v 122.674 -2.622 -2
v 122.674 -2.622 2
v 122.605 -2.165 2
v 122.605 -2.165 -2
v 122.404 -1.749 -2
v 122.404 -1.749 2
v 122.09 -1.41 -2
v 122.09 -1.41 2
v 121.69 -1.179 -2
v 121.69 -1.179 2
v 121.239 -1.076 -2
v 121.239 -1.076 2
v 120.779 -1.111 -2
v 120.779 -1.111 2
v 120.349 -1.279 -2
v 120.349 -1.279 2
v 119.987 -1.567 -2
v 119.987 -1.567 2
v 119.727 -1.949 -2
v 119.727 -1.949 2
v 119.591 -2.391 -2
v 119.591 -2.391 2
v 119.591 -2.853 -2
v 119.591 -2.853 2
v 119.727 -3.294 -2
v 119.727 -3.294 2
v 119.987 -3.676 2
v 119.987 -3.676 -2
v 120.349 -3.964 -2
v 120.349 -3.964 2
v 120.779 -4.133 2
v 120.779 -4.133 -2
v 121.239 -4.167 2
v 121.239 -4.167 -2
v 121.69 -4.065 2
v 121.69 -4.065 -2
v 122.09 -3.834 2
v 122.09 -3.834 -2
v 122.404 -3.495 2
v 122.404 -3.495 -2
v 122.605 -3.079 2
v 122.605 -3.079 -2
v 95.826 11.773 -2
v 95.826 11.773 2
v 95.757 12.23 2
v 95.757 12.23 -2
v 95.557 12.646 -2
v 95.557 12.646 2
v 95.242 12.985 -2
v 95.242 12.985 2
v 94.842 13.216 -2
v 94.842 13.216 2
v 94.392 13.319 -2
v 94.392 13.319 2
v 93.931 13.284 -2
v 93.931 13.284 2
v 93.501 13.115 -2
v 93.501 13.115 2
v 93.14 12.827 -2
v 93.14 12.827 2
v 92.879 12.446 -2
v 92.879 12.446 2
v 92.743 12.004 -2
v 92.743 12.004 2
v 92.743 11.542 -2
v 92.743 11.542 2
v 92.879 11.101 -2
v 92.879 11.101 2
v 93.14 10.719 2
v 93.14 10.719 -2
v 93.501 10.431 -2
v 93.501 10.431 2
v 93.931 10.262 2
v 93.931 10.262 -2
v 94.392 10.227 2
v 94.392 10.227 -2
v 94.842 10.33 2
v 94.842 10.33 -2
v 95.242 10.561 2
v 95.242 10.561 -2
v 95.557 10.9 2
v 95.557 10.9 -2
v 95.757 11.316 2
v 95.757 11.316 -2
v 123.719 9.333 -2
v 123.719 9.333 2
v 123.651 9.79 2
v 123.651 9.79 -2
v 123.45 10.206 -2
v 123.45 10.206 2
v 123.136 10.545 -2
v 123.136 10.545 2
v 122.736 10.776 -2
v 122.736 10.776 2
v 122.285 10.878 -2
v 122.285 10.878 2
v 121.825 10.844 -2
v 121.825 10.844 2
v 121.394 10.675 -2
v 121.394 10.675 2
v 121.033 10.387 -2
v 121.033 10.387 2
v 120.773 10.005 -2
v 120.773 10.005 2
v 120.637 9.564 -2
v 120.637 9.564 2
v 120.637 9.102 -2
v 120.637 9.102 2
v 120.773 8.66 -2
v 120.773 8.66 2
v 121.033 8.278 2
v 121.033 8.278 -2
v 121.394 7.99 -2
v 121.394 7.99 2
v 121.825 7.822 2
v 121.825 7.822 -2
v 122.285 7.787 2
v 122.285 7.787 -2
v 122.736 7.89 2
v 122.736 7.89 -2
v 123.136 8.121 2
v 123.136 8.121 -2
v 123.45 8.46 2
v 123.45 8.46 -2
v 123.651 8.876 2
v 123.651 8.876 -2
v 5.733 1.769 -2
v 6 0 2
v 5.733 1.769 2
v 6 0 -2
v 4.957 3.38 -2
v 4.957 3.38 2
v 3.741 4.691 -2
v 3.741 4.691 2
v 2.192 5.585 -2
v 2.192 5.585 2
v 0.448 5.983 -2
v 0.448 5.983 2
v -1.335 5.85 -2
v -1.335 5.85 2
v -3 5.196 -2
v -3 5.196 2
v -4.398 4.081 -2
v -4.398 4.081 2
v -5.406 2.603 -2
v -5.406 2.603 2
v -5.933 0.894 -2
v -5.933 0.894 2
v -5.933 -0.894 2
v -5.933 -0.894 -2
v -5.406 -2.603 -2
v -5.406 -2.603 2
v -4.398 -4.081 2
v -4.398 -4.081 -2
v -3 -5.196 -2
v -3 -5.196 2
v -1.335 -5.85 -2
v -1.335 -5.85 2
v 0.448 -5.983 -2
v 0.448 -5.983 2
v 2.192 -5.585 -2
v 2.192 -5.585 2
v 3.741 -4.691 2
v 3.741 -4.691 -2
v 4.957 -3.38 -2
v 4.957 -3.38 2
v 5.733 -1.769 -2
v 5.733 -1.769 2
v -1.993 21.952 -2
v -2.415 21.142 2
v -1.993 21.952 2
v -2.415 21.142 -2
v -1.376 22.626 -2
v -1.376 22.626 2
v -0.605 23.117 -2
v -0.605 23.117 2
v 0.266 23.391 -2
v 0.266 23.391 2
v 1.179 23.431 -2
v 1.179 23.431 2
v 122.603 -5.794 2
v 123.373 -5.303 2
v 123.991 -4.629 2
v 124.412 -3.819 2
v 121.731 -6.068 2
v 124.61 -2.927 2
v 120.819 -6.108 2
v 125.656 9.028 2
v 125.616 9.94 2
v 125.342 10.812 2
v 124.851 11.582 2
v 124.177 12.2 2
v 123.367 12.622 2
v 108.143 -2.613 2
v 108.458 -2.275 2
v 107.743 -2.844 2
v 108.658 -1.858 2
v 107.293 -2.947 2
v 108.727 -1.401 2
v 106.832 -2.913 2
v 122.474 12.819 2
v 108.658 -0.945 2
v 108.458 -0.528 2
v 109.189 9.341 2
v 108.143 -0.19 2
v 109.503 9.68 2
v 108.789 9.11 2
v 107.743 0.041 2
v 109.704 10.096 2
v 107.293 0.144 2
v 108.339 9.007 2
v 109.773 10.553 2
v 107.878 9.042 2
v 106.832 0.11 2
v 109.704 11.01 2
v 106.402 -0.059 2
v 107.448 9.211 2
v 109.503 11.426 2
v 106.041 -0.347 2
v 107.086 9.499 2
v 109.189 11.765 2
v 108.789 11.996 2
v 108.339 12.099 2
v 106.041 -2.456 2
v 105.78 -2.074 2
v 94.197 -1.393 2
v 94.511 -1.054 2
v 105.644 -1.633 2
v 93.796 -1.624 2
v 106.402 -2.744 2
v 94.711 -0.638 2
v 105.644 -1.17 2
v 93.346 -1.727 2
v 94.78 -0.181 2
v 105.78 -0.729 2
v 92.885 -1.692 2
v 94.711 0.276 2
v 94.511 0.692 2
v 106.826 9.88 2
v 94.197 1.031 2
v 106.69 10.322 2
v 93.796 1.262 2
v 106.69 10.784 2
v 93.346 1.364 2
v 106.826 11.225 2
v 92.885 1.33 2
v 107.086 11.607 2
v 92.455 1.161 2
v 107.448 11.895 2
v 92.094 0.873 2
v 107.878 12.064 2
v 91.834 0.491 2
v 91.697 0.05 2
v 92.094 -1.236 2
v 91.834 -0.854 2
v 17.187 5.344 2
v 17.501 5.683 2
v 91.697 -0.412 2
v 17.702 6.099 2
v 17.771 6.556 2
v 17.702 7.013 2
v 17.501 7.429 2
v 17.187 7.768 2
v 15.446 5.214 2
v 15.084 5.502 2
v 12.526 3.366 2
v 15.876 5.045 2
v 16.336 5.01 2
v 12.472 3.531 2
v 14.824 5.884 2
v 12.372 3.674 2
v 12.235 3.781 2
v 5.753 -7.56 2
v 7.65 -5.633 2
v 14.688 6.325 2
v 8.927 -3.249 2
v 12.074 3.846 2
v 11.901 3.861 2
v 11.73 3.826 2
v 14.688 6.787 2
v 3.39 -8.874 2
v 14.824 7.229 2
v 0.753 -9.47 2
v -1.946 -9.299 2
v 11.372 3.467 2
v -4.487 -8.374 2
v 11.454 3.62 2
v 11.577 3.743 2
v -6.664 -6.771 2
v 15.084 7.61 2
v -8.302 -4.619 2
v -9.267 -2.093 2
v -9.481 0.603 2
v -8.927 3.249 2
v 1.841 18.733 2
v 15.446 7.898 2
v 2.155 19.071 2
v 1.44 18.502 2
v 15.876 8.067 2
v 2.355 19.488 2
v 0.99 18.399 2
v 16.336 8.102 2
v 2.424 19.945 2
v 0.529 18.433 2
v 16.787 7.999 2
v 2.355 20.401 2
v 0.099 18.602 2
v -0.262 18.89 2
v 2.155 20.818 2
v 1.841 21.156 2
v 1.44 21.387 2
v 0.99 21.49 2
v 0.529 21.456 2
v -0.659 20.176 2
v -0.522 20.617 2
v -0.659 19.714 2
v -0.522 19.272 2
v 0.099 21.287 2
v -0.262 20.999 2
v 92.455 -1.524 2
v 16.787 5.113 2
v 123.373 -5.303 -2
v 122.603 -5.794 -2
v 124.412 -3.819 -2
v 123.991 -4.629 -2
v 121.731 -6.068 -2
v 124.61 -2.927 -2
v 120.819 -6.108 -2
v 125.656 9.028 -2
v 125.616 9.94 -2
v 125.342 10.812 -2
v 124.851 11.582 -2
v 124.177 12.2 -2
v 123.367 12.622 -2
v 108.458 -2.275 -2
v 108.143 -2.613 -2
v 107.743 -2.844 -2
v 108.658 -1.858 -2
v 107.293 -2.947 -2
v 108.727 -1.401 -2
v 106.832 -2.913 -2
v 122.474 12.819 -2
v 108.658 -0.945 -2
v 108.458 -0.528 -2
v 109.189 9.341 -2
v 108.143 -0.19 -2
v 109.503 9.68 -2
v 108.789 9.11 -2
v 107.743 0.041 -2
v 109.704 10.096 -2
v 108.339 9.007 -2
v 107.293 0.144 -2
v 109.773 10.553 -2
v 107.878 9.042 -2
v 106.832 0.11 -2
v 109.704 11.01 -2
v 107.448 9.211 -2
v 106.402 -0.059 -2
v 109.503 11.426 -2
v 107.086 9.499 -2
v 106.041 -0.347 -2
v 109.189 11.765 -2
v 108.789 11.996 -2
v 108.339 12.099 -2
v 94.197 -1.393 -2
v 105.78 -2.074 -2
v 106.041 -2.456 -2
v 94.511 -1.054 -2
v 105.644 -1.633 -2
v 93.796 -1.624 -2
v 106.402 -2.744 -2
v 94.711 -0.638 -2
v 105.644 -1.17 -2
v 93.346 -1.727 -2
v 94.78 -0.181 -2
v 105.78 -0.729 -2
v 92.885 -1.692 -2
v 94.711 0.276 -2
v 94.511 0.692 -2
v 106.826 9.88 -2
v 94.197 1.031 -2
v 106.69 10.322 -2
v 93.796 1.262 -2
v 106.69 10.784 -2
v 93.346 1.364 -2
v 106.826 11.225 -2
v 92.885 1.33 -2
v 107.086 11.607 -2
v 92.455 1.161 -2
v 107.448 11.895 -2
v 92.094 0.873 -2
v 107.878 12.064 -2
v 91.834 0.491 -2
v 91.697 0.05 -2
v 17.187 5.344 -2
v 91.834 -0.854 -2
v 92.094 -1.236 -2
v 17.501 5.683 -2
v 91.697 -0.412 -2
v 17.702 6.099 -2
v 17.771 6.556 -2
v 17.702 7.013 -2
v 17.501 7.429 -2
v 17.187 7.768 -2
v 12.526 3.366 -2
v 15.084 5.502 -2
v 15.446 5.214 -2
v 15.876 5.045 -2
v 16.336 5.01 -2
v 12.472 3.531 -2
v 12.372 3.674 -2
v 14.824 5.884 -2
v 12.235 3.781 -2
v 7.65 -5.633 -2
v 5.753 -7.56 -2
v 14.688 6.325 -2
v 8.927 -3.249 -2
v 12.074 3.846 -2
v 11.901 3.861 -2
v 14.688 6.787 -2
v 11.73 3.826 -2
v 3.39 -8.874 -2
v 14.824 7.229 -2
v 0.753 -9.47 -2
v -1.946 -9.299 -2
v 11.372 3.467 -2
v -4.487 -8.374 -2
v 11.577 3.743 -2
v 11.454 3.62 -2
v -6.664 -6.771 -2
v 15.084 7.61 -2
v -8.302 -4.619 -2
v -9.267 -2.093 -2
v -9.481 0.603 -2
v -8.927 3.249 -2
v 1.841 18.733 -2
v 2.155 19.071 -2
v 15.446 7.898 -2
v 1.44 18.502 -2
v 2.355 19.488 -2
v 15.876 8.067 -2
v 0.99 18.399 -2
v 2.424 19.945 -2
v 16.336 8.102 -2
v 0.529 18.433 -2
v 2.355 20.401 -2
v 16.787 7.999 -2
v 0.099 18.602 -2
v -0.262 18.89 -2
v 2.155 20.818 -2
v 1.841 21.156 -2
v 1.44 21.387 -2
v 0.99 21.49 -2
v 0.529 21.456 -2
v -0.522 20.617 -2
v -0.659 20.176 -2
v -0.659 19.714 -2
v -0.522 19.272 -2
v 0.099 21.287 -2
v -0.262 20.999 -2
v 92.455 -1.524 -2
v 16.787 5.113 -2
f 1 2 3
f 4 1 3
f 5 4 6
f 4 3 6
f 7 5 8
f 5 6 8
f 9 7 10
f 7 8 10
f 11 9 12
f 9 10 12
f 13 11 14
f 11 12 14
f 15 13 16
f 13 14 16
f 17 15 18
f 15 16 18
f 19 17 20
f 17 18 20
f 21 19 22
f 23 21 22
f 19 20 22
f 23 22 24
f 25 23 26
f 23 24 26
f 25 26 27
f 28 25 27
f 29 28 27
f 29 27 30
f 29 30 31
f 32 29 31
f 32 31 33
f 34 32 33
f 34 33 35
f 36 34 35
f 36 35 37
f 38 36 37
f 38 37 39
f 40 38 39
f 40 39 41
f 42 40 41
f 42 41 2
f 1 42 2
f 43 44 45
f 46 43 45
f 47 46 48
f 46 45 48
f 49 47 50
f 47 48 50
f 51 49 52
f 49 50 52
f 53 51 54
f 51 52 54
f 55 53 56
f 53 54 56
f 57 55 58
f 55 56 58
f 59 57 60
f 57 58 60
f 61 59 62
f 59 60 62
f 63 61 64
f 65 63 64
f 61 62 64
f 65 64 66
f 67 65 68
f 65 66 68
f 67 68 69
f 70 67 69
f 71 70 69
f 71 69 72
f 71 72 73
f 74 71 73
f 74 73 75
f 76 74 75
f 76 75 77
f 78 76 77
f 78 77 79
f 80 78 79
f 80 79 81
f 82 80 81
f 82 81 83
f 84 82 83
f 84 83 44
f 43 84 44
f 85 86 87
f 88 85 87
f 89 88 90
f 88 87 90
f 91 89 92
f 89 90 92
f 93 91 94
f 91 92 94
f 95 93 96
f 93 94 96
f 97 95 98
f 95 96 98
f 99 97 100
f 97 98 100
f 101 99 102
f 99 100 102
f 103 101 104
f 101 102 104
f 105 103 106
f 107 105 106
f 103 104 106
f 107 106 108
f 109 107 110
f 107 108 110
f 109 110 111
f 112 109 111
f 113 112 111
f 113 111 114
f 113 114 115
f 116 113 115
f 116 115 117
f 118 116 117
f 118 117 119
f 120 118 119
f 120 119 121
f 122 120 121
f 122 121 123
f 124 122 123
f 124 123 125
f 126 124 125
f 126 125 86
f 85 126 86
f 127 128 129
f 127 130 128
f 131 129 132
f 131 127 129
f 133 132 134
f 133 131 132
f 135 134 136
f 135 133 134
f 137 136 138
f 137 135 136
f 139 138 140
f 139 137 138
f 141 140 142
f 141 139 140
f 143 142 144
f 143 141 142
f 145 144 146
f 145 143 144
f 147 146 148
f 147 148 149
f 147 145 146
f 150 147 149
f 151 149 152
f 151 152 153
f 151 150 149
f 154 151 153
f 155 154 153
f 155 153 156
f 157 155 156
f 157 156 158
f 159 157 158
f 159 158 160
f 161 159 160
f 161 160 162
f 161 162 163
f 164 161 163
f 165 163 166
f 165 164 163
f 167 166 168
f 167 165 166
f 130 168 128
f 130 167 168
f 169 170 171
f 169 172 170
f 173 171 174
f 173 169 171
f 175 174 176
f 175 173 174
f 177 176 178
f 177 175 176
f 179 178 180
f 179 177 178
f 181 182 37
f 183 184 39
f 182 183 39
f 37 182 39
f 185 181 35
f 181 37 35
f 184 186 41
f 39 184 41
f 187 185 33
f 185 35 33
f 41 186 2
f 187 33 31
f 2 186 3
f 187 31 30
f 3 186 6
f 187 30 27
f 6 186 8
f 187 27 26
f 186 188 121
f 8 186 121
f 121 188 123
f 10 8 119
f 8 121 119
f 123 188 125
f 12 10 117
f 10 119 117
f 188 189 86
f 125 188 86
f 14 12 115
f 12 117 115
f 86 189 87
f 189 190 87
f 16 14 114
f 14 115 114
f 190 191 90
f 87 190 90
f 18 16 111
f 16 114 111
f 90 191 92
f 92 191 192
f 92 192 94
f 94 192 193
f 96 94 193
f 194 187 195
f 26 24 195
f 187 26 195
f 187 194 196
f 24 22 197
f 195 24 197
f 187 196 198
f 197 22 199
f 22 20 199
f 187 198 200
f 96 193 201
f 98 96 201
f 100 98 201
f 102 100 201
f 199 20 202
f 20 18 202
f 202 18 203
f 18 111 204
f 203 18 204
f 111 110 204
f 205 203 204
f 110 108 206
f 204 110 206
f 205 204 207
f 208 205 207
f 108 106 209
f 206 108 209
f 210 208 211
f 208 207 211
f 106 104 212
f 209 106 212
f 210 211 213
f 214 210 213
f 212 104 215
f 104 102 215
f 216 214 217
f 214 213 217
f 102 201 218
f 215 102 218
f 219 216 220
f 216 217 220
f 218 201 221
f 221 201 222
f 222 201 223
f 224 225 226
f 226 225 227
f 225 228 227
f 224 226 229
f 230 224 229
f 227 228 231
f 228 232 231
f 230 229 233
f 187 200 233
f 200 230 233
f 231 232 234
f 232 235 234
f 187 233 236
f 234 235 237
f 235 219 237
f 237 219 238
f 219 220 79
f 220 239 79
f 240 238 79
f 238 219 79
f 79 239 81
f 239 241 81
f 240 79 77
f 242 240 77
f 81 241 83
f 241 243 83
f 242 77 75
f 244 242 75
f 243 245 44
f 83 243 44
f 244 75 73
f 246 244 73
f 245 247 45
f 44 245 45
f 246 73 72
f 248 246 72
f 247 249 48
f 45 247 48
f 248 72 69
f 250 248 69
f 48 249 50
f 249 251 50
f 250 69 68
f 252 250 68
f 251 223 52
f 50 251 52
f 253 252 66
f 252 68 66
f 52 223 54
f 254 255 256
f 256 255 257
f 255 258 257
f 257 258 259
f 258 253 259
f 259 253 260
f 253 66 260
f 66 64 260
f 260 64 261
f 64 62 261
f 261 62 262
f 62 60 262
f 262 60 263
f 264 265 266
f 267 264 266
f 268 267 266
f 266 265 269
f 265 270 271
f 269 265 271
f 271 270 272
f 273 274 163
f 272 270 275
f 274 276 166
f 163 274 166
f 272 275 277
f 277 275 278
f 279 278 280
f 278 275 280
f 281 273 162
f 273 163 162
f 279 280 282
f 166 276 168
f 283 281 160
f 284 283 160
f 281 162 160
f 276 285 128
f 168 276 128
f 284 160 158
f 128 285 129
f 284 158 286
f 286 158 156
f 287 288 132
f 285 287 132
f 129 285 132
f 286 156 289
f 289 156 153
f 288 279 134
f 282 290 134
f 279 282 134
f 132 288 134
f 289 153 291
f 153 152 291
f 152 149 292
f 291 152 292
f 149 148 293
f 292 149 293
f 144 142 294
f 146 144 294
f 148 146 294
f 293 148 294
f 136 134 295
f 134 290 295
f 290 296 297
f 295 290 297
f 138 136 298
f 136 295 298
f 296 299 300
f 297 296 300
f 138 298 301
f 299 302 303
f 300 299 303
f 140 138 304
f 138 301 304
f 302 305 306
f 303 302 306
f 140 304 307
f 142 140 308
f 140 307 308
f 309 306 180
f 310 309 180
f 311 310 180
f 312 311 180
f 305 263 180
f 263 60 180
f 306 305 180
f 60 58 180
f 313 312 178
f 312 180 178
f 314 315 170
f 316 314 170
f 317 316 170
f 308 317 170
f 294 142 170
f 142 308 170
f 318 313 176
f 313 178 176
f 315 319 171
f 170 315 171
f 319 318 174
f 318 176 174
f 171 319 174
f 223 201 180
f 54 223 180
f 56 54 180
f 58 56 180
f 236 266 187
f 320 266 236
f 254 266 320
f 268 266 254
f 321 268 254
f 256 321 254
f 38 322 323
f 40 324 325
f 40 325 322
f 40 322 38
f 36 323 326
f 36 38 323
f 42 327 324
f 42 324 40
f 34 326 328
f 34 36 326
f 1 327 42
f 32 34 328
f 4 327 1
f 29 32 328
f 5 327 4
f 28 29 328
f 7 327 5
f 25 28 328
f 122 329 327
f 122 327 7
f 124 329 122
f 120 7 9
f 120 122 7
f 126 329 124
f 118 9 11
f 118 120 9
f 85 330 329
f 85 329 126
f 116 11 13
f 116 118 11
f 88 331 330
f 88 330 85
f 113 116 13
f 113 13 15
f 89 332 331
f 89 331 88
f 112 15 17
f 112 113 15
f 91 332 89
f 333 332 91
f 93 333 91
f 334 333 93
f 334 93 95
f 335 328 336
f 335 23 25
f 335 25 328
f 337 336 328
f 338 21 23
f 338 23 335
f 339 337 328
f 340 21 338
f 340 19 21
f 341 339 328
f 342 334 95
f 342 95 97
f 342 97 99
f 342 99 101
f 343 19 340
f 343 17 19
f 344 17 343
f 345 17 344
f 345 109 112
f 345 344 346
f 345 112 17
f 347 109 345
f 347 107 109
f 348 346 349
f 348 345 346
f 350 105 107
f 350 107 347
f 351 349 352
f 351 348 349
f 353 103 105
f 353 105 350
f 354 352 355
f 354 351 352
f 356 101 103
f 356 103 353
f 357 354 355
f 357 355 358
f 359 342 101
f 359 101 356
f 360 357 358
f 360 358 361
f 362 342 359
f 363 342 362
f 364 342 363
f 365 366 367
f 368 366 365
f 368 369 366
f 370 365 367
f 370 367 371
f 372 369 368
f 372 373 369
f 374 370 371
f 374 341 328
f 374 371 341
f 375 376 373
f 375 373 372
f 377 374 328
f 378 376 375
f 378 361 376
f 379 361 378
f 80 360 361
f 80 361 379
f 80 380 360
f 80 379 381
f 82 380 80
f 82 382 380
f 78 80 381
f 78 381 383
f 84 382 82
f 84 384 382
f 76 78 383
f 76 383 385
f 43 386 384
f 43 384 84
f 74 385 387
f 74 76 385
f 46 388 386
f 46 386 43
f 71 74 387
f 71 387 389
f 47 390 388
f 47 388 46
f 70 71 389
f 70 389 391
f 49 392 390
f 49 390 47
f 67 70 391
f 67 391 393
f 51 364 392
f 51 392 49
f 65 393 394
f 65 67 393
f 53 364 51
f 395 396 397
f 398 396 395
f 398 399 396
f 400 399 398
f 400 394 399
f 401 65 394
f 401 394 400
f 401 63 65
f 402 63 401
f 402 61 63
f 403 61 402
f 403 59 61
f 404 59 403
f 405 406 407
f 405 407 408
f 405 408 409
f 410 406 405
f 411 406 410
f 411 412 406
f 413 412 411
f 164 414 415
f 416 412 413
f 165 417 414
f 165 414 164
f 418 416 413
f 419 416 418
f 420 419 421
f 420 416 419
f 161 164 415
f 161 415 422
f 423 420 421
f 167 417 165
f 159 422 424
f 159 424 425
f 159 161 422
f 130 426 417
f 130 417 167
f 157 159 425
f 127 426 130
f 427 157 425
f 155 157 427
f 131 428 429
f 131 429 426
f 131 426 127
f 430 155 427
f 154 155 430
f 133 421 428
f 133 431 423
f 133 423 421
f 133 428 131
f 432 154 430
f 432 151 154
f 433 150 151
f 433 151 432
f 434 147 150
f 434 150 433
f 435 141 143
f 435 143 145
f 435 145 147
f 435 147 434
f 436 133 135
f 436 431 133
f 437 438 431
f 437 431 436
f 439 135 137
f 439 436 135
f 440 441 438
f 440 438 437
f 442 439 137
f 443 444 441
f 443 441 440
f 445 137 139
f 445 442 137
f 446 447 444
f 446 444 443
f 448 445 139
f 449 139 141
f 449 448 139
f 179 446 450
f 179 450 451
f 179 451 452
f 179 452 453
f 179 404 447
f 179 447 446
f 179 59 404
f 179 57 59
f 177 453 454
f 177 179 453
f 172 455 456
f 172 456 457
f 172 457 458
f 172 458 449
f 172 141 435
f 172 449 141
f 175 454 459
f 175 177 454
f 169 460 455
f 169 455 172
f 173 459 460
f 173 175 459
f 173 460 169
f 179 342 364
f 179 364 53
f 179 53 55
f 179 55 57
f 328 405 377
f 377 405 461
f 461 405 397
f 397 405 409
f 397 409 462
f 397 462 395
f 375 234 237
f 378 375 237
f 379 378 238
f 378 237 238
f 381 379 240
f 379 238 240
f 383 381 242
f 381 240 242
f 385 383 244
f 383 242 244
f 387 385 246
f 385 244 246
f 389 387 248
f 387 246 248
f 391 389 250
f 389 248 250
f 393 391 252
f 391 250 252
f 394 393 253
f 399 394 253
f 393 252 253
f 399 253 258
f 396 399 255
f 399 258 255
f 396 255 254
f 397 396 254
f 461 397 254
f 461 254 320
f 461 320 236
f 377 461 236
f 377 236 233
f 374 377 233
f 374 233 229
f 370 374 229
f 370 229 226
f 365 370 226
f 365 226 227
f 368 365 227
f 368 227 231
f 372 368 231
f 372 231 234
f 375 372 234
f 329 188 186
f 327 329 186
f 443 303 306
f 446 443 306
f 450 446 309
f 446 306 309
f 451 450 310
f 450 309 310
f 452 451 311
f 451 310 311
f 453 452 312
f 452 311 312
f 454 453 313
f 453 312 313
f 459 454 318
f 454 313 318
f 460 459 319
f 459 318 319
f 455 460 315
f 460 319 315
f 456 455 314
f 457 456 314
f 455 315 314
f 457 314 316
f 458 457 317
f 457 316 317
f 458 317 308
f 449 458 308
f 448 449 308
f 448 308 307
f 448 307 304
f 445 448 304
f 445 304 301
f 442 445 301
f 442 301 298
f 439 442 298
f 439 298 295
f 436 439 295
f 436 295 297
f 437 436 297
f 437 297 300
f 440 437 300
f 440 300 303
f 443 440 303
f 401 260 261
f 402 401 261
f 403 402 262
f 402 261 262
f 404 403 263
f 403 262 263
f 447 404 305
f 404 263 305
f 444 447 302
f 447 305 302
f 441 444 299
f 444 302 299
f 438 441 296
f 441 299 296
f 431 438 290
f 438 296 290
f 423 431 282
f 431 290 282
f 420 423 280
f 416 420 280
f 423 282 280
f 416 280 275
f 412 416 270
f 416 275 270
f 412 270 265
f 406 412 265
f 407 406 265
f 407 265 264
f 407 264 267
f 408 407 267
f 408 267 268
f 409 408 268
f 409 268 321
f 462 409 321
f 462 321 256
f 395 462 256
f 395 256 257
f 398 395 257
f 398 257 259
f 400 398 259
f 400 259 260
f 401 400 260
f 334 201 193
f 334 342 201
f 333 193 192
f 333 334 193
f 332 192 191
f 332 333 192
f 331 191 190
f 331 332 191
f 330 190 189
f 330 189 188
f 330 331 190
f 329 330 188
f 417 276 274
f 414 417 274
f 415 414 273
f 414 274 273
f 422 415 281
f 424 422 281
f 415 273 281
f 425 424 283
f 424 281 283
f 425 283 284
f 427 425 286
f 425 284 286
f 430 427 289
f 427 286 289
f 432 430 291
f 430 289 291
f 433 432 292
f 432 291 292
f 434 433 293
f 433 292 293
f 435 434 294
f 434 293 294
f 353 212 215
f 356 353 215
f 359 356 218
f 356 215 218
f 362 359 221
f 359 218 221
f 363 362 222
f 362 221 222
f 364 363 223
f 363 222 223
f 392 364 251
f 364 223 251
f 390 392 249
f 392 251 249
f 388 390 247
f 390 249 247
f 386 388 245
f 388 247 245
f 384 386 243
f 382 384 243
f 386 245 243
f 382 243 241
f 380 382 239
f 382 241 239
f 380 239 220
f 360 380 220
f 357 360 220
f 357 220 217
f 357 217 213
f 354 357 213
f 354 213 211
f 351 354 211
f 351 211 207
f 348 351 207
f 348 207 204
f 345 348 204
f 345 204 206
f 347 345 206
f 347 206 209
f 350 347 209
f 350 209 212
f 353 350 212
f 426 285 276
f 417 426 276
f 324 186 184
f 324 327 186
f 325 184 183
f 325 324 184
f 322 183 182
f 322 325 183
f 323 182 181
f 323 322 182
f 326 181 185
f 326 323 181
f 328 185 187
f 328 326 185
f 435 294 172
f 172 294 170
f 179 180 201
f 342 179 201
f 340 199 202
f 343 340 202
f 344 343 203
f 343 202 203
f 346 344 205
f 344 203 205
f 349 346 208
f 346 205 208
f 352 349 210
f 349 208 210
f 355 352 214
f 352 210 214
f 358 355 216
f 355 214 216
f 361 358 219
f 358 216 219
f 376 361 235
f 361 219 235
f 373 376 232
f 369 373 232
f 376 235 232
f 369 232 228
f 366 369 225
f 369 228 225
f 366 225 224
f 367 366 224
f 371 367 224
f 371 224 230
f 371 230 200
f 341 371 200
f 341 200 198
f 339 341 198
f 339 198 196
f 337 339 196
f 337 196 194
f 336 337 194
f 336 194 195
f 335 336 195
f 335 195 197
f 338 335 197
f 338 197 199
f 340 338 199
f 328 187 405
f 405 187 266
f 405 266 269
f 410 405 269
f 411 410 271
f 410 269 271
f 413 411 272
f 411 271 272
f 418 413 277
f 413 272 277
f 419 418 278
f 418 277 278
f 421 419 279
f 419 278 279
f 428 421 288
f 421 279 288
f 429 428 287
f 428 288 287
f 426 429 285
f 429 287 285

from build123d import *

# Parameters (mm, degrees)
SKETCH_1_R          = 6
EXTRUDE_1_DEPTH     = 2
SKETCH_2_R          = 1.55
SKETCH_2_R_2        = 0.6
CUT_EXTRUDE_1_DEPTH = 5
FILLET_1_R          = 3.5
CUT_EXTRUDE_2_DEPTH = 5
SKETCH_4_R          = 1.55
CUT_EXTRUDE_3_DEPTH = 5
FILLET_2_R          = 3.5


with BuildPart() as part:
    # 草图1 → 凸台-拉伸1 (new body, symmetric)
    with BuildSketch(Plane.XY):
        with BuildLine():
            Line((-8.927079897, 3.249191362), (-1.4961968, 23.665374879))
            Line((-1.4961968, 23.665374879), (160.827979556, 9.463849632))
            ThreePointArc((160.827979556, 9.463849632), (169.463849632, -0.827979556), (159.172020444, -9.463849632))
            Line((159.172020444, -9.463849632), (11.371578553, 3.467013498))
            Line((11.371578553, 3.467013498), (8.927079897, -3.249191362))
            ThreePointArc((8.927079897, -3.249191362), (-3.249191362, -8.927079897), (-8.927079897, 3.249191362))
        make_face()
        Circle(SKETCH_1_R, mode=Mode.SUBTRACT)
        with Locations((160, 0)):
            Circle(SKETCH_1_R, mode=Mode.SUBTRACT)
    extrude(amount=EXTRUDE_1_DEPTH, both=True)

    # 草图2 → 切除-拉伸1 (cut, through all)
    with BuildSketch(Plane.XY.offset(2)):
        with Locations((0.874182871, 19.944624098)):
            Circle(SKETCH_2_R)
        with Locations((16.220555377, 6.556152427)):
            Circle(SKETCH_2_R)
        with Locations((11.935394126, 3.261801412)):
            Circle(SKETCH_2_R_2)
    extrude(amount=-CUT_EXTRUDE_1_DEPTH, mode=Mode.SUBTRACT)

    # 圆角1
    fillet_1_edges = [part.edges().sort_by_distance(p)[0] for p in [
        (-1.4961968, 23.665374879, 0),
    ]]
    fillet(fillet_1_edges, radius=FILLET_1_R)

    # 草图3 → 切除-拉伸2 (cut, through all)
    with BuildSketch(Plane.XY.offset(2)):
        with BuildLine():
            Line((125.961165123, 12.514300628), (124.305206011, -6.413398636))
            Line((124.305206011, -6.413398636), (159.172020444, -9.463849632))
            ThreePointArc((159.172020444, -9.463849632), (169.463849632, -0.827979556), (160.827979556, 9.463849632))
            Line((160.827979556, 9.463849632), (125.961165123, 12.514300628))
        make_face()
    extrude(amount=-CUT_EXTRUDE_2_DEPTH, mode=Mode.SUBTRACT)

    # 草图4 → 切除-拉伸3 (cut, through all)
    with BuildSketch(Plane.XY.offset(2)):
        with Locations((122.16943858, 9.332664284)):
            Circle(SKETCH_4_R)
        with Locations((121.123569667, -2.621672093)):
            Circle(SKETCH_4_R)
        with Locations((94.275987033, 11.773025081)):
            Circle(SKETCH_4_R)
        with Locations((93.23011812, -0.181311296)):
            Circle(SKETCH_4_R)
        with Locations((108.222712807, 10.552844683)):
            Circle(SKETCH_4_R)
        with Locations((107.176843894, -1.401491694)):
            Circle(SKETCH_4_R)
    extrude(amount=-CUT_EXTRUDE_3_DEPTH, mode=Mode.SUBTRACT)

    # 圆角2
    fillet_2_edges = [part.edges().sort_by_distance(p)[0] for p in [
        (125.961165123, 12.514300628, 0),
        (124.305206011, -6.413398636, 0),
    ]]
    fillet(fillet_2_edges, radius=FILLET_2_R)


solid = part.part
